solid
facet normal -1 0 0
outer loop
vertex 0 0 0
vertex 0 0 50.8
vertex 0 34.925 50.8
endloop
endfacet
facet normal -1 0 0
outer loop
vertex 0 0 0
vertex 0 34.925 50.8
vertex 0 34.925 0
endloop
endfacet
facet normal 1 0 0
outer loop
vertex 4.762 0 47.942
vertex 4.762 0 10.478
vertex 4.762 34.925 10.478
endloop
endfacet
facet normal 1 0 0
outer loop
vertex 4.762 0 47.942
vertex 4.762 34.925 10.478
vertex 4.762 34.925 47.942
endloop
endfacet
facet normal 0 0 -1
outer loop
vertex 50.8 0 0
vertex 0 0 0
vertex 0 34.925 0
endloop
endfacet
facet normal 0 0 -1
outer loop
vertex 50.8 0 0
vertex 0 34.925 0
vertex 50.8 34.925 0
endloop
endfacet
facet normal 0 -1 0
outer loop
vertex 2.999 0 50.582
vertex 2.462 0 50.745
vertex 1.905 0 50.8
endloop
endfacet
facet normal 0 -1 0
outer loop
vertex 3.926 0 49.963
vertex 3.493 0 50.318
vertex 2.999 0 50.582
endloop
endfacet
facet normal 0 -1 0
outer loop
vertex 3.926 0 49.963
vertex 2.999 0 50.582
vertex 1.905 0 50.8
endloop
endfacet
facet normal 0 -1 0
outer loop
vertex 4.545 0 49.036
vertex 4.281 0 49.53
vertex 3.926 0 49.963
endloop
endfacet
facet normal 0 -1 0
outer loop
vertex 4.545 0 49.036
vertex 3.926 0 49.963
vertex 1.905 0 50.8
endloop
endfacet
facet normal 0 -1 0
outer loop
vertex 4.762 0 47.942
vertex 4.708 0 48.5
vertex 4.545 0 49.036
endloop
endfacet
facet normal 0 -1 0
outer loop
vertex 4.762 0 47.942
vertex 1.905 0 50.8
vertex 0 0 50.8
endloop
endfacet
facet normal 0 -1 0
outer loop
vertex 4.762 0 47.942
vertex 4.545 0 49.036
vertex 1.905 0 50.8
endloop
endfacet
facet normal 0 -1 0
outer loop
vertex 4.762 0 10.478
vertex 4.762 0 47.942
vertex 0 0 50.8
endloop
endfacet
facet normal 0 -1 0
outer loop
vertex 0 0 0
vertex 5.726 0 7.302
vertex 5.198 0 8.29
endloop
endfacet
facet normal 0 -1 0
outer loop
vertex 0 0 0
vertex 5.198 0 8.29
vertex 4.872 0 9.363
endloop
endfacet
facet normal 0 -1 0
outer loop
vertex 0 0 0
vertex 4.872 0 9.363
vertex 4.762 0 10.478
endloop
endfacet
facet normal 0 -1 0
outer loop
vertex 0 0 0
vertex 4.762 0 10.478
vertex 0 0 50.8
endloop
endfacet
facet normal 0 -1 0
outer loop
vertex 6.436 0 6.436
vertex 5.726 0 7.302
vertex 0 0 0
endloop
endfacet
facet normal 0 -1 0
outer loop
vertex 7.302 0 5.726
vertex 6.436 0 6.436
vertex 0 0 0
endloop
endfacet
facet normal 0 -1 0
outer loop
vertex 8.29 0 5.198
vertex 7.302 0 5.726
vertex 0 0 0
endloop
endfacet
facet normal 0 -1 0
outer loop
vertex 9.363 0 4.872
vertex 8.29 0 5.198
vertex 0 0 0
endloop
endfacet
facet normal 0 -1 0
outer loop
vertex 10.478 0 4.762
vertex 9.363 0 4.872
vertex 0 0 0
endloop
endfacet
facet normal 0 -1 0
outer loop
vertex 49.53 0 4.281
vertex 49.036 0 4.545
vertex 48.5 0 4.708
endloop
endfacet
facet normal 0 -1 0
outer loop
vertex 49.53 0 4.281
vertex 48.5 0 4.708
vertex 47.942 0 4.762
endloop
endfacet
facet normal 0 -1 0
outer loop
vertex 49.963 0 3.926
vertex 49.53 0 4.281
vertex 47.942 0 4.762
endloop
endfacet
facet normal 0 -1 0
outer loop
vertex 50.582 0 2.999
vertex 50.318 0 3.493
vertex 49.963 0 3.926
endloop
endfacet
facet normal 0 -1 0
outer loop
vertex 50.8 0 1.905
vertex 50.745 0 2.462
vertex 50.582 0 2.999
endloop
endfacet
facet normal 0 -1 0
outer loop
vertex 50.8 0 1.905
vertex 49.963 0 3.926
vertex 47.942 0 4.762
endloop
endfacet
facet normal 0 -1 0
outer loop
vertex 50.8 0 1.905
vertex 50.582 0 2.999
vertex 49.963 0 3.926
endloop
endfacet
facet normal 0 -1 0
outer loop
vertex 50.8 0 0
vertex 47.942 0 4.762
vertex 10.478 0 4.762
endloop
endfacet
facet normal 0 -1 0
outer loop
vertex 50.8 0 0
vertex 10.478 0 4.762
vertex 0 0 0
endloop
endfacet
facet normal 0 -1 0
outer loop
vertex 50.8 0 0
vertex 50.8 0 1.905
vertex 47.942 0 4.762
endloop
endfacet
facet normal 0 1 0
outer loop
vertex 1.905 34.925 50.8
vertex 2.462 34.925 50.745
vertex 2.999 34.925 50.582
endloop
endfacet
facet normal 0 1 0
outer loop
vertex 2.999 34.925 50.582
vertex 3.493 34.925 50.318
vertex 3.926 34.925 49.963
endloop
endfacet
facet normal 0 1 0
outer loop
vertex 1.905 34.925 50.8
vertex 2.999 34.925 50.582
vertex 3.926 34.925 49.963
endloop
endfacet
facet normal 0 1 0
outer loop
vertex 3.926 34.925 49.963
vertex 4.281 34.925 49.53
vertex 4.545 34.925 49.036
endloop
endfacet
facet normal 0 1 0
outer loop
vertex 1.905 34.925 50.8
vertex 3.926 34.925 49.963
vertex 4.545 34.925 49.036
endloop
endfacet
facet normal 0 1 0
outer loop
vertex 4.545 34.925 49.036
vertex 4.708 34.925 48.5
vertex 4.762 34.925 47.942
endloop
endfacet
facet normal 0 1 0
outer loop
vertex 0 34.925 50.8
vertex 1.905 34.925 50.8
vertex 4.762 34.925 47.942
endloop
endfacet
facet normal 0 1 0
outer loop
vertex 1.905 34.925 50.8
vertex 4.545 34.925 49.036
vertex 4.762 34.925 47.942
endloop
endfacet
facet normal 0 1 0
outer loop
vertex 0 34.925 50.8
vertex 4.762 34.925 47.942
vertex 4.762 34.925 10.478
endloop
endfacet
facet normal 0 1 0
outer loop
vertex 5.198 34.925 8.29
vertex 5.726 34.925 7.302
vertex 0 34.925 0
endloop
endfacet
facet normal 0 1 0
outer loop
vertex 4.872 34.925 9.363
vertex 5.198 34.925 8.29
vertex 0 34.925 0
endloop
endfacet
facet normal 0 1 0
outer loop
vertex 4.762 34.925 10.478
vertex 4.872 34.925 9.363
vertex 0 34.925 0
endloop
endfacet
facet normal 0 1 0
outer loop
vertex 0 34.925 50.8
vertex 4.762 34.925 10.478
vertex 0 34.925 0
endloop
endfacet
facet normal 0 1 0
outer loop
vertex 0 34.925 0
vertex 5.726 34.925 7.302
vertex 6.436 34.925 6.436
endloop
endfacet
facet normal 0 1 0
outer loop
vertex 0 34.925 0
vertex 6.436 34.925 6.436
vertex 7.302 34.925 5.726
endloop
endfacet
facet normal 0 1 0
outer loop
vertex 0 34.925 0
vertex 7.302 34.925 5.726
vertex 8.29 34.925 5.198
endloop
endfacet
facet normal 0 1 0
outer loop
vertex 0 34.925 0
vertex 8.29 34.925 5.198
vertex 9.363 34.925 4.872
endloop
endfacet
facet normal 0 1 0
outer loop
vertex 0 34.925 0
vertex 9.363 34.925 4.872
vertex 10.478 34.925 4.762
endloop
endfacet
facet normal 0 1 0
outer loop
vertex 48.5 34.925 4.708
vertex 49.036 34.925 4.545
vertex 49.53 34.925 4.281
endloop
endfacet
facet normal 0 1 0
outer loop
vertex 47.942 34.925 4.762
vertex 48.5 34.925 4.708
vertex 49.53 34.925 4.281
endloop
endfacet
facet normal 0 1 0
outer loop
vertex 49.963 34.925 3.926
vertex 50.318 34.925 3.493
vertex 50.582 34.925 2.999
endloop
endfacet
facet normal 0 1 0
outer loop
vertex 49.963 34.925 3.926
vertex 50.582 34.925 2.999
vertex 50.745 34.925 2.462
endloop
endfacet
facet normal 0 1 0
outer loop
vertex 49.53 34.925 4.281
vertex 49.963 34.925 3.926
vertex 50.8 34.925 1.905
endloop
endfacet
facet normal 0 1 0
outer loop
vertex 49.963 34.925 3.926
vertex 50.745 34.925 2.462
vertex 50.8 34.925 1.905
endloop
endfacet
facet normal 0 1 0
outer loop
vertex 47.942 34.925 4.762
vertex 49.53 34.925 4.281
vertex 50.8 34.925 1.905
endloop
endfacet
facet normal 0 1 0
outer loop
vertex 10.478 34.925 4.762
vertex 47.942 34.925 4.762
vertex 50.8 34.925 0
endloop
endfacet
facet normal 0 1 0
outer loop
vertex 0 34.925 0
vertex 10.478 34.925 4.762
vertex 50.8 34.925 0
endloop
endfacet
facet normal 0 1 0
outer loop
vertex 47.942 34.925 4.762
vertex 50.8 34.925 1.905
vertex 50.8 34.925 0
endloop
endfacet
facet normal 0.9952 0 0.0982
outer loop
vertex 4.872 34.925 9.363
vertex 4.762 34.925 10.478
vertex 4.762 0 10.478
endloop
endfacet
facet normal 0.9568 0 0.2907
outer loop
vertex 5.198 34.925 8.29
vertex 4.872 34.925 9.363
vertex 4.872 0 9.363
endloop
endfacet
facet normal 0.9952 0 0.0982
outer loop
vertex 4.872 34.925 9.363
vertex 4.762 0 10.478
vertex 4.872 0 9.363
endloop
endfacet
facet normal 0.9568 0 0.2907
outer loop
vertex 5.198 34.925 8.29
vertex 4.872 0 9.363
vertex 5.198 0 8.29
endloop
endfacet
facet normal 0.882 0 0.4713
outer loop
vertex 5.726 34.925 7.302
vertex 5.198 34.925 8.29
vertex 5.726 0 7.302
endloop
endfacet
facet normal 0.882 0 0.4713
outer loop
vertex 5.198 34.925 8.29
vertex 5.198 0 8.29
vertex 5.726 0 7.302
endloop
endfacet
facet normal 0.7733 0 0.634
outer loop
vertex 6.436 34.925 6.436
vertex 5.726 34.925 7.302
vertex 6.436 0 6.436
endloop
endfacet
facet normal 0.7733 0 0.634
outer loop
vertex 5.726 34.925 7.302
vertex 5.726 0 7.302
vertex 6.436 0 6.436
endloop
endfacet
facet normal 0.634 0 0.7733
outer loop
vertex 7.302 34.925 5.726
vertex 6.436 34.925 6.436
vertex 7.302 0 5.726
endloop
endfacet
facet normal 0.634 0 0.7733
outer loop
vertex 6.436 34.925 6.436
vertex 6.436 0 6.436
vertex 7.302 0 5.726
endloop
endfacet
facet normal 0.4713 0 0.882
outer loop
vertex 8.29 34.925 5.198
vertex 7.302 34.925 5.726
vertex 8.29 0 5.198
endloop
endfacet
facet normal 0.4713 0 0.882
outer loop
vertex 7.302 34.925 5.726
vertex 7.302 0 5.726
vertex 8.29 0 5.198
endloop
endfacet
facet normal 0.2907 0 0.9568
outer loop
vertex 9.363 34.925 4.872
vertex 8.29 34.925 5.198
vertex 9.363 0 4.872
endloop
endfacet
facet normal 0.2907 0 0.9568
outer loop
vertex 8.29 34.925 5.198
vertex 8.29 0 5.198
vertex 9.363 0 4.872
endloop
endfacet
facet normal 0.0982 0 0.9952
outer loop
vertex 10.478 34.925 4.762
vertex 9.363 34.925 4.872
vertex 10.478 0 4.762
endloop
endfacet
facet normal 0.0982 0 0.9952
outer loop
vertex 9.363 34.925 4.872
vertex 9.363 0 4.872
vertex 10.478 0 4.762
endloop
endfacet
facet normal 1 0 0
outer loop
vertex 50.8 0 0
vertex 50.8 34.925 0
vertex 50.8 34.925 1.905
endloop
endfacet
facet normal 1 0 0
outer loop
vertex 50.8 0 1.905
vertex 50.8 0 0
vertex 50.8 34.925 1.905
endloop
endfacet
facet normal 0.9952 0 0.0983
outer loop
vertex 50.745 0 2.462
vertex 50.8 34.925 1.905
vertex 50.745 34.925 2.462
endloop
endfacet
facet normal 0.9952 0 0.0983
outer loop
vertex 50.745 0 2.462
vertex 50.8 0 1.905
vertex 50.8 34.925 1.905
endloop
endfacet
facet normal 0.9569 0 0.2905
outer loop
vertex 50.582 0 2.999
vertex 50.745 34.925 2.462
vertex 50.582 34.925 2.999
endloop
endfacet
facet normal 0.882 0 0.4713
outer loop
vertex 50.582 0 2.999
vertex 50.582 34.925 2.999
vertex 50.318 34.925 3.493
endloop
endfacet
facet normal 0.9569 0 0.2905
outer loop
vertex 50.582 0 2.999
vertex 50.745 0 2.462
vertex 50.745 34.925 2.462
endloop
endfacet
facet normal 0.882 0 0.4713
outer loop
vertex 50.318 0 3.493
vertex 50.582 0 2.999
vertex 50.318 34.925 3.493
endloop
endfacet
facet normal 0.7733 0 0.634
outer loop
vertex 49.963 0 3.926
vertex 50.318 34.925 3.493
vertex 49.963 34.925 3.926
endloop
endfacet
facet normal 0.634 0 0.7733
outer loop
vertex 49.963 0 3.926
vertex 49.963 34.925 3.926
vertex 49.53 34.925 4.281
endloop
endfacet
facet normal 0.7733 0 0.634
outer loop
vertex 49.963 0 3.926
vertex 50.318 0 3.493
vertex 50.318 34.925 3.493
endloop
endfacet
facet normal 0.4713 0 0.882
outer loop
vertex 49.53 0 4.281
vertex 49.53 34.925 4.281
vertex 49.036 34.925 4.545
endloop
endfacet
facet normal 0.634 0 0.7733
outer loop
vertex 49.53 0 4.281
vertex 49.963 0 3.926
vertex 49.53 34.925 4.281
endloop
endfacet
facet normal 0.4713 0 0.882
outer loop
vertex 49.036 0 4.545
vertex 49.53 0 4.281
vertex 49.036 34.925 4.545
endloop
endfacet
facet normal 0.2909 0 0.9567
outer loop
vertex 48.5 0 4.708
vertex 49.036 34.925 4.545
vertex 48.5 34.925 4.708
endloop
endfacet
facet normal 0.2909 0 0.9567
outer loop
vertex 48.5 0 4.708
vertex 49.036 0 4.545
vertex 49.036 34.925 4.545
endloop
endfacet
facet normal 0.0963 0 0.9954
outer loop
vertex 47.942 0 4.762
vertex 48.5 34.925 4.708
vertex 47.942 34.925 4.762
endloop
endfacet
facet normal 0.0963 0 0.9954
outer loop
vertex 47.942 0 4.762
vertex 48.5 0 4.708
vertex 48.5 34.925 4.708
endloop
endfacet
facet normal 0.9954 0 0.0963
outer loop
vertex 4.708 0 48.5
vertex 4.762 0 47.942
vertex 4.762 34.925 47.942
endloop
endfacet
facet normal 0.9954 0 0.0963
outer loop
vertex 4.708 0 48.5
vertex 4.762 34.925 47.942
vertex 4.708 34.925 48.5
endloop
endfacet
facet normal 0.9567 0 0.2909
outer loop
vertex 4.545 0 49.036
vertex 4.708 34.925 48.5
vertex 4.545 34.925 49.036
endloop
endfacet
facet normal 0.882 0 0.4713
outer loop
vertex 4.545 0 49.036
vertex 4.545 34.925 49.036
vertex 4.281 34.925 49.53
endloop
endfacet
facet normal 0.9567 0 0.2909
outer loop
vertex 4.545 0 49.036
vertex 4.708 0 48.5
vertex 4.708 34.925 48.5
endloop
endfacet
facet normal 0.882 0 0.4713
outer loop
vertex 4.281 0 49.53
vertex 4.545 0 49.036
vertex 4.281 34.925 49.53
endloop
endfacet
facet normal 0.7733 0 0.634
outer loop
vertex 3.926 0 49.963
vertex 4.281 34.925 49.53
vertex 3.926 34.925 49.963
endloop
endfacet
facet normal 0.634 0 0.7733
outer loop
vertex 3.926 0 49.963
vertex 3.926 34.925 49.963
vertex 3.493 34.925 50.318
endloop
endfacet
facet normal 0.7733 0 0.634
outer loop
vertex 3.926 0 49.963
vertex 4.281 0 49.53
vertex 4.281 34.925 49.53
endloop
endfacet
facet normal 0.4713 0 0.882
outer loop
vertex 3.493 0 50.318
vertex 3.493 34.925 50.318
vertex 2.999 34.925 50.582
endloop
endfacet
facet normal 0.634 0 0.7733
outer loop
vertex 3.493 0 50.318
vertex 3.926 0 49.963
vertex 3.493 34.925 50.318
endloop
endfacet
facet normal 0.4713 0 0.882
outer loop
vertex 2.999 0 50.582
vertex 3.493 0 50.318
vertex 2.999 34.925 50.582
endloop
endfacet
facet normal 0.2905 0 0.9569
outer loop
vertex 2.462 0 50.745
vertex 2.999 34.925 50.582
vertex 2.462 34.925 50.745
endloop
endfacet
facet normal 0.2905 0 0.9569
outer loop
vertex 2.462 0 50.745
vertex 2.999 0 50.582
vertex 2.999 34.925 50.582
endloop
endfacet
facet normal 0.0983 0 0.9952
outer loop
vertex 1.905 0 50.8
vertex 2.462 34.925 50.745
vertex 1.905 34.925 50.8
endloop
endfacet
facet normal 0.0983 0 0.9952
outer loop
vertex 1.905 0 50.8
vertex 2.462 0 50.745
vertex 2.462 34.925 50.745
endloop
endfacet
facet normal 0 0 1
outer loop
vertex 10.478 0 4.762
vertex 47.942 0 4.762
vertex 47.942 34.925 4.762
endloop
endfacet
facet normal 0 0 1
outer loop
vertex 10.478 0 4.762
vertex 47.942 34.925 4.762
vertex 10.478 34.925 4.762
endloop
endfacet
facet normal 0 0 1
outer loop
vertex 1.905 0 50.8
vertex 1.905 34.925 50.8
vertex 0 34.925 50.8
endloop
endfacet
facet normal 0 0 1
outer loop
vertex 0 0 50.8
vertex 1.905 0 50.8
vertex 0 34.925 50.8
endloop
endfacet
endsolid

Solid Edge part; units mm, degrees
sketch "Sketch1" plane through (0, 0, 0) normal (0, -1, 0) x (1, 0, 0)
  line L0 (0, 50.8) -> (0, 0)
  line L1 (0, 0) -> (50.8, 0)
  line L2 (50.8, 0) -> (50.8, 1.905)
  arc A0 (50.8, 1.905) -> (47.9425, 4.7625) centre (47.9425, 1.905) ccw
  line L3 (47.9425, 4.7625) -> (10.4775, 4.7625)
  arc A1 (10.4775, 4.7625) -> (4.7625, 10.4775) centre (10.4775, 10.4775) cw
  line L4 (4.7625, 10.4775) -> (4.7625, 47.9425)
  arc A2 (4.7625, 47.9425) -> (1.905, 50.8) centre (1.905, 47.9425) ccw
  line L5 (1.905, 50.8) -> (0, 50.8)
  dimension "D1" = 50.8
extrude "Protrusion1" add sketch "Sketch1" against normal blind 34.925
